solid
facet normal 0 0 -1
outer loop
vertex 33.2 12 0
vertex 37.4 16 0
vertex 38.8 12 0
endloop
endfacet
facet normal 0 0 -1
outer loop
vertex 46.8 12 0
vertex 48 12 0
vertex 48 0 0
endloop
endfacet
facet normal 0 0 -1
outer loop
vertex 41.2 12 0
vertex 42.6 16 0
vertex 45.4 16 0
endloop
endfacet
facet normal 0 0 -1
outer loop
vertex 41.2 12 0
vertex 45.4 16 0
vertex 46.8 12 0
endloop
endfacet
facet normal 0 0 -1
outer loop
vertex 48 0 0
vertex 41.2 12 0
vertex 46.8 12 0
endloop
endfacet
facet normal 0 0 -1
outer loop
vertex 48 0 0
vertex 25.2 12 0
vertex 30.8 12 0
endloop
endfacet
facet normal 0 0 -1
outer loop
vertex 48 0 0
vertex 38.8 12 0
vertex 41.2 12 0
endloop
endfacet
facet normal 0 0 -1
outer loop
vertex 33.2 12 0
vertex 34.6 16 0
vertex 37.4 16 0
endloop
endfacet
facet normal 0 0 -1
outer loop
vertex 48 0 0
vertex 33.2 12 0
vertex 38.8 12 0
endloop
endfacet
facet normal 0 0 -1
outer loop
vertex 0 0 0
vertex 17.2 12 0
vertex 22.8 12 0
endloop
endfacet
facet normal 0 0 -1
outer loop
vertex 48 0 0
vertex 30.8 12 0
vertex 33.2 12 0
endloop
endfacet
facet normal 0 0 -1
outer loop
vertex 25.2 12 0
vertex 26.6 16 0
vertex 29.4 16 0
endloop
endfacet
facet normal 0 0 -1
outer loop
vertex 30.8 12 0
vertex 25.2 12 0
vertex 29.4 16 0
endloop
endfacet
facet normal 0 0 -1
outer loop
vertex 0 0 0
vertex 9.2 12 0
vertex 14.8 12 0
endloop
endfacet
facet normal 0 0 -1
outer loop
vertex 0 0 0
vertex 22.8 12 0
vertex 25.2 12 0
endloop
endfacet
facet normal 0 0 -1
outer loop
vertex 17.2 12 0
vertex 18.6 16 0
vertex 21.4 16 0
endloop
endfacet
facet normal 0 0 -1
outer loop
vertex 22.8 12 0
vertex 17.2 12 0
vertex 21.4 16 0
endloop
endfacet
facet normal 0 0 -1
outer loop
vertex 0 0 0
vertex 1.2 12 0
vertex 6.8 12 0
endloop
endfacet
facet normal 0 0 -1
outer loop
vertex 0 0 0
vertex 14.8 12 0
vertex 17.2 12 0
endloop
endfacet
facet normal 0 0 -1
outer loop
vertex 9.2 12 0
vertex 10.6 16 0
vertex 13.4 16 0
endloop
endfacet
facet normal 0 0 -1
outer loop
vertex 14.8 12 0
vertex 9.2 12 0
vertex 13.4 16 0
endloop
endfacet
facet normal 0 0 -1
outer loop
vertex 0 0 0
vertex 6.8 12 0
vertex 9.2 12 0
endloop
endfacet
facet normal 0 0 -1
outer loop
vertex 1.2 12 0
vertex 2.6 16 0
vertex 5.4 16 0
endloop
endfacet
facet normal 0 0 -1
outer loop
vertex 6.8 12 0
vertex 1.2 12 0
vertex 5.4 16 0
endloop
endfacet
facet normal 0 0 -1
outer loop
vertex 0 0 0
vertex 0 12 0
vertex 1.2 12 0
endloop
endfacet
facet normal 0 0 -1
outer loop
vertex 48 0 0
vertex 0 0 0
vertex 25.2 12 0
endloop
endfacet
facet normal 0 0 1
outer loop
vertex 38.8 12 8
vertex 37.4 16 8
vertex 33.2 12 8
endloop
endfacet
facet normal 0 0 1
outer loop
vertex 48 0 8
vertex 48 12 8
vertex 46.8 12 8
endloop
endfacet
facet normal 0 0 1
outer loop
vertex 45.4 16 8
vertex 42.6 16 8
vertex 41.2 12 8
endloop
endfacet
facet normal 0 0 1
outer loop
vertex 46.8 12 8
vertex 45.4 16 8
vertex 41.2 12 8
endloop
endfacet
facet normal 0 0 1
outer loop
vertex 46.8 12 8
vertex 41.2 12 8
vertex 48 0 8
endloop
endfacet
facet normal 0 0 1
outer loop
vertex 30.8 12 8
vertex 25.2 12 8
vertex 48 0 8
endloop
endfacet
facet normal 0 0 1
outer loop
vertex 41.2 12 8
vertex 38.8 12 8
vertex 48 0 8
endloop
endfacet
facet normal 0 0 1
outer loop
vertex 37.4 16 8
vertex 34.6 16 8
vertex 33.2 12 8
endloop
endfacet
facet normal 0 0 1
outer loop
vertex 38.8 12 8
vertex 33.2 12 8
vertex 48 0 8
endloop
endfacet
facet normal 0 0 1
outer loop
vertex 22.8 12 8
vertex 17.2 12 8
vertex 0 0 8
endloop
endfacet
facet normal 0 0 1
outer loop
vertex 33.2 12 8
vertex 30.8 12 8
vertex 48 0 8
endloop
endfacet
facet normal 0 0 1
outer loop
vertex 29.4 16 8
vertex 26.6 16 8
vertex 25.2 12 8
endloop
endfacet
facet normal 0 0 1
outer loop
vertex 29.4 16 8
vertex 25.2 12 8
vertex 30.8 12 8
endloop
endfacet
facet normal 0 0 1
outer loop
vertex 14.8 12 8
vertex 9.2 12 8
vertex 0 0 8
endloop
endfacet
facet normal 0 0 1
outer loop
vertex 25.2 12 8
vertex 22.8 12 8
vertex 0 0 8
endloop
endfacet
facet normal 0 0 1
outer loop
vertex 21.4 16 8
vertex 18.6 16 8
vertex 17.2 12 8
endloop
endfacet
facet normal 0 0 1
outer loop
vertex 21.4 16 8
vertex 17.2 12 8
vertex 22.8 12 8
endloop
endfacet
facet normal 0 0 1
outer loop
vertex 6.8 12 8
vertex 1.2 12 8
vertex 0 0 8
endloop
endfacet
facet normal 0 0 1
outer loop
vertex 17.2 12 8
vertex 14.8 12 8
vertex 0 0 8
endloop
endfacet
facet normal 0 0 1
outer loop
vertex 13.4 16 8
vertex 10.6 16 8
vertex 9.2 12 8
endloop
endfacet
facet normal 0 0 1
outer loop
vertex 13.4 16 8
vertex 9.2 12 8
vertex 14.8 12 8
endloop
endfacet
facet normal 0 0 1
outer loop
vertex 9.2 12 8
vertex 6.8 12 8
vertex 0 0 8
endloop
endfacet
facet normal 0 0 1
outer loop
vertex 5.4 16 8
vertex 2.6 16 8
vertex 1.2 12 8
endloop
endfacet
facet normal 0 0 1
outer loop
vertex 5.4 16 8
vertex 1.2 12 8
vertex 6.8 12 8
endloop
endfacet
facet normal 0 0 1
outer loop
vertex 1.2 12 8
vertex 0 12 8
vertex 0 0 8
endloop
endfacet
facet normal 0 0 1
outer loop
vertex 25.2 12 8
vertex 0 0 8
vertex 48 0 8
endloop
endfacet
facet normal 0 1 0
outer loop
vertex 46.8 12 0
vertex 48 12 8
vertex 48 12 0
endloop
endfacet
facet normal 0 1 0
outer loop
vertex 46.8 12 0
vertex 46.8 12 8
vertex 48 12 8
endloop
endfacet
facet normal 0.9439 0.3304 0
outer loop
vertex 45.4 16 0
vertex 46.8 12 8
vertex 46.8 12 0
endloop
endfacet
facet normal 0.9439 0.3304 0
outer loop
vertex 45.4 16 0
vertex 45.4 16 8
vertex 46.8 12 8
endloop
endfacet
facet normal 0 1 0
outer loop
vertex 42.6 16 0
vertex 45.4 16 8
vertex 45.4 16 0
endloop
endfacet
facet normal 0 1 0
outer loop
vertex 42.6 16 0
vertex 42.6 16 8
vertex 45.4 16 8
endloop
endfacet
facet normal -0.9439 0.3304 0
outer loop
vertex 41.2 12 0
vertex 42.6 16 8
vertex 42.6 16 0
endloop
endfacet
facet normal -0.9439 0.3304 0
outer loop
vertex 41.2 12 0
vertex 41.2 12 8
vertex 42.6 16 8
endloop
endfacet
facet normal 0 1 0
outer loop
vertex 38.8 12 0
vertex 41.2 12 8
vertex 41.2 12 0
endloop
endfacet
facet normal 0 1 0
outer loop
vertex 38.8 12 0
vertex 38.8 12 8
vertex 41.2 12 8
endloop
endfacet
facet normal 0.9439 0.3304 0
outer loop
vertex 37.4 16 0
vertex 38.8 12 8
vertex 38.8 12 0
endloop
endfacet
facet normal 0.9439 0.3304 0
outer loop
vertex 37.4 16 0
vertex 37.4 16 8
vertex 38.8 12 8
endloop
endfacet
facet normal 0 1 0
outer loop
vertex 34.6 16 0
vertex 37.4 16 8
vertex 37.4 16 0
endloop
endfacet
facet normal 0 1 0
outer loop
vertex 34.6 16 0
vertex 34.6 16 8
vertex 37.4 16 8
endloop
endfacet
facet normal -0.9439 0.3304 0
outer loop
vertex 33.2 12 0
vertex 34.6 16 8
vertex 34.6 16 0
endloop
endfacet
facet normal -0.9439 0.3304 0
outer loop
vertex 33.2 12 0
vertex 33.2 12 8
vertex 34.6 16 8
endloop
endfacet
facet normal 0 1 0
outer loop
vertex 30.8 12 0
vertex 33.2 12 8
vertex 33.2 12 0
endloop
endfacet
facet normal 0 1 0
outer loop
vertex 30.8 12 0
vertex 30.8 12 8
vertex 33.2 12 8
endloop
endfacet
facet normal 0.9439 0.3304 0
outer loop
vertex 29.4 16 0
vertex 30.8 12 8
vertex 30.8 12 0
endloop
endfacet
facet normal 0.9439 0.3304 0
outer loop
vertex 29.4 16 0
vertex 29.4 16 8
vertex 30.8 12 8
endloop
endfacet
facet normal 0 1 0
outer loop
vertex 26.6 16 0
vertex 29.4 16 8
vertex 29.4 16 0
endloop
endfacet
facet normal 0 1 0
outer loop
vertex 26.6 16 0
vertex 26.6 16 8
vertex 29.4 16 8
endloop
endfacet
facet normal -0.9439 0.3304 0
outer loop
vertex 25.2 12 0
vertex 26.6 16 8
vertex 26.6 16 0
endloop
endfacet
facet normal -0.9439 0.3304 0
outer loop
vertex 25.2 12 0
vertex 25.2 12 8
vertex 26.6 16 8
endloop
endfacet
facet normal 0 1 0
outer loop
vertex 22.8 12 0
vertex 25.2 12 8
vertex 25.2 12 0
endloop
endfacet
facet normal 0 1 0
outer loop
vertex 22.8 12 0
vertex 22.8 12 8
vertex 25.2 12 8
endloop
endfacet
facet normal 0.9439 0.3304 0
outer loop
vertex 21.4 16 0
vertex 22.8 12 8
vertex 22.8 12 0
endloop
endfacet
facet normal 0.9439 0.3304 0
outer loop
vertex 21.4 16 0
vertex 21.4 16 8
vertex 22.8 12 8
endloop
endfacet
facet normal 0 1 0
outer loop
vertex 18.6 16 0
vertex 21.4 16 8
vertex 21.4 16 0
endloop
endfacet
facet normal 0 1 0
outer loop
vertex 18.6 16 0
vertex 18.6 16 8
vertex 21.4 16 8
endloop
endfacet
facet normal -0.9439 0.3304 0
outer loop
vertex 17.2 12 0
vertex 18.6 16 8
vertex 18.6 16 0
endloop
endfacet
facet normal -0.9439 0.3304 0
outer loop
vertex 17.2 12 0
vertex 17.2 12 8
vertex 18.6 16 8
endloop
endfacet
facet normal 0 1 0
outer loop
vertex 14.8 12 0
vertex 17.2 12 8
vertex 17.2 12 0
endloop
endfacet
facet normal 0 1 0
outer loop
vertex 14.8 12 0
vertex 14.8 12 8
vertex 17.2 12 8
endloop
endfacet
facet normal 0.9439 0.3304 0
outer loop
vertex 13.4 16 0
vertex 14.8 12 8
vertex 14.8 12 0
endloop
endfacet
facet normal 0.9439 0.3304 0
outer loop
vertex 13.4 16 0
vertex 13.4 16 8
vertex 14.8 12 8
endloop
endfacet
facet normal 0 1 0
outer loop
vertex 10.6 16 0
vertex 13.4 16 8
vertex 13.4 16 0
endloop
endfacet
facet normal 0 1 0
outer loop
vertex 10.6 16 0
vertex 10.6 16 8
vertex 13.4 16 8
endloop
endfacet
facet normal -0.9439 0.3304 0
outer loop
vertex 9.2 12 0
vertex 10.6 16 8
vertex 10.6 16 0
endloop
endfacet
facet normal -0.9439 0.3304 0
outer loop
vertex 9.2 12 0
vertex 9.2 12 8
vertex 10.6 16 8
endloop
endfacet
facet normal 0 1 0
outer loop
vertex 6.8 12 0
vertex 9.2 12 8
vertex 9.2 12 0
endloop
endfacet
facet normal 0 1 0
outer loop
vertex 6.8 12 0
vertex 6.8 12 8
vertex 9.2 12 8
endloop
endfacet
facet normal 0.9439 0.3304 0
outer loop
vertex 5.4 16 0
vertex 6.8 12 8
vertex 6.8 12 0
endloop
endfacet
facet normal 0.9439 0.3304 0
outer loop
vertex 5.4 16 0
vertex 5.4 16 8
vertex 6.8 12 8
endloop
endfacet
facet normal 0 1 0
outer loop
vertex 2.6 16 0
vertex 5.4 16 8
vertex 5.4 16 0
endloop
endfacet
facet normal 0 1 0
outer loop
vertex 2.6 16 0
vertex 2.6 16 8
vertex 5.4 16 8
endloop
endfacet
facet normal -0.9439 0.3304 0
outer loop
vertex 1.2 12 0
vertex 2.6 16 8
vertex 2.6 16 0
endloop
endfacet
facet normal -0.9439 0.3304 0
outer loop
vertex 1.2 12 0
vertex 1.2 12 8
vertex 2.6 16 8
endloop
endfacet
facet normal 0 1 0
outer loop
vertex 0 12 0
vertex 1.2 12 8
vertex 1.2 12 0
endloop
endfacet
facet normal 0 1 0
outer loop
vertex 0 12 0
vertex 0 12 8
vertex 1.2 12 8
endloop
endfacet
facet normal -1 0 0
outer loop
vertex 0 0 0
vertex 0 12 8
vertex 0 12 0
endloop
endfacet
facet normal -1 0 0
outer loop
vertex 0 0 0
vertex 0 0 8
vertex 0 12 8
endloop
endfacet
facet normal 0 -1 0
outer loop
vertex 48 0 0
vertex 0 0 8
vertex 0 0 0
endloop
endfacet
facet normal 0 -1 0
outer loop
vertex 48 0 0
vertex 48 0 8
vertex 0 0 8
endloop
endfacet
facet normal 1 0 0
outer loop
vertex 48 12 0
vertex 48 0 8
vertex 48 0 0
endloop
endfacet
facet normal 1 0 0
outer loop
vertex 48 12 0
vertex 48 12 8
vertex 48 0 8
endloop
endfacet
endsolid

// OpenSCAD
$fn = 32;

// ----------------------------------------------------------------------
// Gear rack: 6 teeth, pitch 8 mm
// ----------------------------------------------------------------------

// --- parameters (mm) ---
teeth = 6;                // number of teeth
pitch = 8;                // tooth pitch, X
root_w = 5.6;             // tooth width at the root
tip_w = 2.8;              // tooth width at the tip
base_h = 12;              // rack body height, Y
tooth_h = 4;              // tooth height above the body
plate_t = 8;              // rack width, Z (extrusion height)
fit_tol = 0.05;           // declared fit tolerance (prompt contract)
free_tol = 0.3;           // declared free tolerance (prompt contract)

rack_l = teeth * pitch;  // overall length
total_h = base_h + tooth_h;  // overall height

profile = [[0, 0], [48, 0], [48, 12], [46.8, 12], [45.4, 16], [42.6, 16], [41.2, 12], [38.8, 12], [37.4, 16], [34.6, 16], [33.2, 12], [30.8, 12], [29.4, 16], [26.6, 16], [25.2, 12], [22.8, 12], [21.4, 16], [18.6, 16], [17.2, 12], [14.8, 12], [13.4, 16], [10.6, 16], [9.2, 12], [6.8, 12], [5.4, 16], [2.6, 16], [1.2, 12], [0, 12]];  // primary outline, 28 points, counter clockwise

// --- the one profile operation ---
linear_extrude(height = plate_t) polygon(points = profile);
